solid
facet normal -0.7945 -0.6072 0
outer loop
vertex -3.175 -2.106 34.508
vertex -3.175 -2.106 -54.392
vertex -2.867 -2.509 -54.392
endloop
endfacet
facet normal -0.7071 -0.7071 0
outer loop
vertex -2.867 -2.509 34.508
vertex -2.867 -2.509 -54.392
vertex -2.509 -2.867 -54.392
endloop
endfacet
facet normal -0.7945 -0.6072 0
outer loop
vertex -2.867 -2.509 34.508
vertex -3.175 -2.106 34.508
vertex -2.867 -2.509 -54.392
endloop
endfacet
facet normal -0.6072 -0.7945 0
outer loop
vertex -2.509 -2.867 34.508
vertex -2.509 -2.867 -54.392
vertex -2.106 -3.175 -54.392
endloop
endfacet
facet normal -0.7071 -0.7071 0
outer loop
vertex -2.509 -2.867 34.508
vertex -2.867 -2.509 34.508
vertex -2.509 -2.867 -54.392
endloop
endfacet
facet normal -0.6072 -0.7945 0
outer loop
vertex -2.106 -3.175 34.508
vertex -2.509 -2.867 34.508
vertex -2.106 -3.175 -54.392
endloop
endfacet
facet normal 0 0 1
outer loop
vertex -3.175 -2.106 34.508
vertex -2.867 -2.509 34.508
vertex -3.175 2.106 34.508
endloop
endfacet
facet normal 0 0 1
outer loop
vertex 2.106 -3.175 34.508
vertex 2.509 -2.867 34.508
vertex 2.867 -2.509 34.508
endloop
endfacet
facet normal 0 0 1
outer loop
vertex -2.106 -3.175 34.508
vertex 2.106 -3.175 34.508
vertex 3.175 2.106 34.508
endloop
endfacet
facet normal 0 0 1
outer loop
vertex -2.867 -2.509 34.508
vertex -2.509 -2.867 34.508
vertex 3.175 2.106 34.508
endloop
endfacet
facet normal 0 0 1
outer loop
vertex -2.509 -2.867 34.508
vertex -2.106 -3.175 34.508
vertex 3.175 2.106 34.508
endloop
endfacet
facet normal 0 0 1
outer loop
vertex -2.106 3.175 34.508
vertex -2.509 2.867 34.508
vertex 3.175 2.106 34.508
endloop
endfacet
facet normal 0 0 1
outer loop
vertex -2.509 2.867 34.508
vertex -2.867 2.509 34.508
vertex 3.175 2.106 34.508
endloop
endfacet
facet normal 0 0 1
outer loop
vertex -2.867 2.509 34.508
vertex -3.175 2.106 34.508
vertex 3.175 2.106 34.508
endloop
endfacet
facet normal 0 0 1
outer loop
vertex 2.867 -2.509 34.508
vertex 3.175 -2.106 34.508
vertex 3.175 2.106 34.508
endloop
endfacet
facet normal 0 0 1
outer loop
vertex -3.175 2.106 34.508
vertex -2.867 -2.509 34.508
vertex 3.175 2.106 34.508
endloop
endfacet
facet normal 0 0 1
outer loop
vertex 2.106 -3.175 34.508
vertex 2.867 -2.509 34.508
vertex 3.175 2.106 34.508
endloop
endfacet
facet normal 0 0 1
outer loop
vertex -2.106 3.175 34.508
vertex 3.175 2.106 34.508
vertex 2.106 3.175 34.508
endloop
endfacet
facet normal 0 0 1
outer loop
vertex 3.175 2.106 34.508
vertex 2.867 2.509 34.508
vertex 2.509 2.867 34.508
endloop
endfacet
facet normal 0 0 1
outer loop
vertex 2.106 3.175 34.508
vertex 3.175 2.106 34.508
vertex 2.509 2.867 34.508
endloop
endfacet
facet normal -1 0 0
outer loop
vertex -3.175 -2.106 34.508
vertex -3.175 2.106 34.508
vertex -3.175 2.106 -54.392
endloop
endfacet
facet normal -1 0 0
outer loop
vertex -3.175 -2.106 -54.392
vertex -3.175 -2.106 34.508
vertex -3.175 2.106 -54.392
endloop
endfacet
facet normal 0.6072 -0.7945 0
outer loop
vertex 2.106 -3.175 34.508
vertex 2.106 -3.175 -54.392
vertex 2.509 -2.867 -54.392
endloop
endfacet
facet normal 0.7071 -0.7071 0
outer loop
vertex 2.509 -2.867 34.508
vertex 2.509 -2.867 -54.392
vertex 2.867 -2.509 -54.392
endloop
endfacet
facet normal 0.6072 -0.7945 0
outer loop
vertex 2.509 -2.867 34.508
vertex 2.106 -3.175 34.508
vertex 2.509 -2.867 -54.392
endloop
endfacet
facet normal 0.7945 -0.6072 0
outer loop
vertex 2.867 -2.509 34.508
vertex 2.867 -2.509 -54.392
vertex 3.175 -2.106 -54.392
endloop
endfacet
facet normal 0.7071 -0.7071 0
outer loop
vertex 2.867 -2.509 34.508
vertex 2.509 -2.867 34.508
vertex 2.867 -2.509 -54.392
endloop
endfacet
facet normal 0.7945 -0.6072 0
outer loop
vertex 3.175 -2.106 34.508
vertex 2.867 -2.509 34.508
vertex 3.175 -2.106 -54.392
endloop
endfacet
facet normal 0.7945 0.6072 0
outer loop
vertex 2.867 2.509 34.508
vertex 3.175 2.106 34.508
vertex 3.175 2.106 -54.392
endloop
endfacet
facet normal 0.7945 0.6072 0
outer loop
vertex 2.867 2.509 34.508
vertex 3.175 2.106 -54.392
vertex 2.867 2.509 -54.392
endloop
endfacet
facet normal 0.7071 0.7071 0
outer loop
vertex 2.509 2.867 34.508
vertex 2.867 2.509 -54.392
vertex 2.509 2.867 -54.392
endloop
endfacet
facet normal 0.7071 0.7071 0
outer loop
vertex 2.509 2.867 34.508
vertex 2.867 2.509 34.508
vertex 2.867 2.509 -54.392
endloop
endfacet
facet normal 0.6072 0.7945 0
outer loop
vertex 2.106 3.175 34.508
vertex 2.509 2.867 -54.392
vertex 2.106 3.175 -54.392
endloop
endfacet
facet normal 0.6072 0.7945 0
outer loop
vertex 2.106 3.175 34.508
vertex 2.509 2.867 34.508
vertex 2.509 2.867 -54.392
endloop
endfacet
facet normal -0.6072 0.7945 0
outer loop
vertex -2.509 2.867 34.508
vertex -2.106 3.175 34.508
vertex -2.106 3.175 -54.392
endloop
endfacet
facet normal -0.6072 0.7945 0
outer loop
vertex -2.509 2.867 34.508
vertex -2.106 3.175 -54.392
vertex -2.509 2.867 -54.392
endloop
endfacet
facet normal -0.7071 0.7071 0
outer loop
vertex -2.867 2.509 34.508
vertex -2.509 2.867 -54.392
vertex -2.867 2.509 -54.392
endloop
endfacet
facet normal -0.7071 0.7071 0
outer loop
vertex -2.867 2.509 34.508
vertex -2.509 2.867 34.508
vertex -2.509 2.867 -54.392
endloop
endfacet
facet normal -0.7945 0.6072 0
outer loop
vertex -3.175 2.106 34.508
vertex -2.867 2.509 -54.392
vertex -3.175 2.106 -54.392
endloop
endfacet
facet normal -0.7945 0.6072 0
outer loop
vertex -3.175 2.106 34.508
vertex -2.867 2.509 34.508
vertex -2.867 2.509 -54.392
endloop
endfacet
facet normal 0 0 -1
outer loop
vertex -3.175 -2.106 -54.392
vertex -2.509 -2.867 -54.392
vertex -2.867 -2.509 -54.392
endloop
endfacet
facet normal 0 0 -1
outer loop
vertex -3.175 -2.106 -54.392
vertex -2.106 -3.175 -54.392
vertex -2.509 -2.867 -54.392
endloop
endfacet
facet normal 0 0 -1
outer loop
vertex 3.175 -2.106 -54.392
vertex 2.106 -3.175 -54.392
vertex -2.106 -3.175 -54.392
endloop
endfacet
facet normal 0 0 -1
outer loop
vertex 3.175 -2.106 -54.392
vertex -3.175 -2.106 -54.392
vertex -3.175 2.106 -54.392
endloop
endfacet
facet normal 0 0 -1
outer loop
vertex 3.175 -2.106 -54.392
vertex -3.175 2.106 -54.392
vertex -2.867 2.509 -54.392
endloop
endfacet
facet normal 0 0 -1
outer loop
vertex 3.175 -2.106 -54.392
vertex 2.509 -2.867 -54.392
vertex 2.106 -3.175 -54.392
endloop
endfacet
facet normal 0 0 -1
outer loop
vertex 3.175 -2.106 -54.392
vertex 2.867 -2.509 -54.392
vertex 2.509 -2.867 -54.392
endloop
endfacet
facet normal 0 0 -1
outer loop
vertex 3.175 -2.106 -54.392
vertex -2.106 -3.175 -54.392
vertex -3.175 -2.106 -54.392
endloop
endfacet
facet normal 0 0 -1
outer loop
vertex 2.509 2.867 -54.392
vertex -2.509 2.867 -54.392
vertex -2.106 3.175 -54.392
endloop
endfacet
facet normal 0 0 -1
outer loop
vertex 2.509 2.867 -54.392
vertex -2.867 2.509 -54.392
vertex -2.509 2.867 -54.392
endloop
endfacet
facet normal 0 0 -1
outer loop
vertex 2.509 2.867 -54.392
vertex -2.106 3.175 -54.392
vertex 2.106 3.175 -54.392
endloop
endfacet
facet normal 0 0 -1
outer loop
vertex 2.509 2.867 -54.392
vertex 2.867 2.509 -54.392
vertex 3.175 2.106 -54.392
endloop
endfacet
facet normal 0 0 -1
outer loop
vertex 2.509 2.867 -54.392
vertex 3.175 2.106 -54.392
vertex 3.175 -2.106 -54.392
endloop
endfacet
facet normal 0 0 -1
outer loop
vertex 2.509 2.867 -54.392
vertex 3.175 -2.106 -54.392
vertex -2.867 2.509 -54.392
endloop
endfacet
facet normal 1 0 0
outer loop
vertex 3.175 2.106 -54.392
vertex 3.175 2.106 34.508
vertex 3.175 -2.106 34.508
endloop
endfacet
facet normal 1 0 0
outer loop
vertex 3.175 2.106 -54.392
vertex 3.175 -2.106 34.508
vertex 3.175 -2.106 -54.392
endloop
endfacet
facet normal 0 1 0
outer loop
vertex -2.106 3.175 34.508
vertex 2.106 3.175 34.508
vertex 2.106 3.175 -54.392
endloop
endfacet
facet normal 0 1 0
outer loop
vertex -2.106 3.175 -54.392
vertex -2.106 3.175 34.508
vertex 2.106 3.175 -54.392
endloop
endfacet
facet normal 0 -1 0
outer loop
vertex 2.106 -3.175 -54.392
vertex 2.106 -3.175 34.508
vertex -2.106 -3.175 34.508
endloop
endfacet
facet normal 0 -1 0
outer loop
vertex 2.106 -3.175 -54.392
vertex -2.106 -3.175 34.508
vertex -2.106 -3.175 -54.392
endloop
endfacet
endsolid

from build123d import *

# Parameters (mm, degrees)
SKETCH4_W           = 88.9
SKETCH4_H           = 6.35
BOSS_EXTRUDE1_DEPTH = 3.175
SKETCH6_OUTSIDE_W   = 26.22
SKETCH6_OUTSIDE_H   = 26.22
SKETCH6_OUTSIDE_R   = 3.81
CUT_EXTRUDE3_DEPTH  = 90.013320632


with BuildPart() as part:
    # Sketch4 → Boss-Extrude1 (new, symmetric)
    with BuildSketch(Plane(origin=(0, 0, 0), x_dir=(0, 0, -1), z_dir=(1, 0, 0))):
        with Locations((9.941503671, 0)):
            Rectangle(SKETCH4_W, SKETCH4_H)
    extrude(amount=BOSS_EXTRUDE1_DEPTH, both=True)

    # Sketch6 outside → Cut-Extrude3 (cut, through all)
    with BuildSketch(Plane.XY.offset(34.508496329)):
        Rectangle(SKETCH6_OUTSIDE_W, SKETCH6_OUTSIDE_H)
        Circle(SKETCH6_OUTSIDE_R, mode=Mode.SUBTRACT)
    extrude(amount=-CUT_EXTRUDE3_DEPTH, mode=Mode.SUBTRACT)


solid = part.part
